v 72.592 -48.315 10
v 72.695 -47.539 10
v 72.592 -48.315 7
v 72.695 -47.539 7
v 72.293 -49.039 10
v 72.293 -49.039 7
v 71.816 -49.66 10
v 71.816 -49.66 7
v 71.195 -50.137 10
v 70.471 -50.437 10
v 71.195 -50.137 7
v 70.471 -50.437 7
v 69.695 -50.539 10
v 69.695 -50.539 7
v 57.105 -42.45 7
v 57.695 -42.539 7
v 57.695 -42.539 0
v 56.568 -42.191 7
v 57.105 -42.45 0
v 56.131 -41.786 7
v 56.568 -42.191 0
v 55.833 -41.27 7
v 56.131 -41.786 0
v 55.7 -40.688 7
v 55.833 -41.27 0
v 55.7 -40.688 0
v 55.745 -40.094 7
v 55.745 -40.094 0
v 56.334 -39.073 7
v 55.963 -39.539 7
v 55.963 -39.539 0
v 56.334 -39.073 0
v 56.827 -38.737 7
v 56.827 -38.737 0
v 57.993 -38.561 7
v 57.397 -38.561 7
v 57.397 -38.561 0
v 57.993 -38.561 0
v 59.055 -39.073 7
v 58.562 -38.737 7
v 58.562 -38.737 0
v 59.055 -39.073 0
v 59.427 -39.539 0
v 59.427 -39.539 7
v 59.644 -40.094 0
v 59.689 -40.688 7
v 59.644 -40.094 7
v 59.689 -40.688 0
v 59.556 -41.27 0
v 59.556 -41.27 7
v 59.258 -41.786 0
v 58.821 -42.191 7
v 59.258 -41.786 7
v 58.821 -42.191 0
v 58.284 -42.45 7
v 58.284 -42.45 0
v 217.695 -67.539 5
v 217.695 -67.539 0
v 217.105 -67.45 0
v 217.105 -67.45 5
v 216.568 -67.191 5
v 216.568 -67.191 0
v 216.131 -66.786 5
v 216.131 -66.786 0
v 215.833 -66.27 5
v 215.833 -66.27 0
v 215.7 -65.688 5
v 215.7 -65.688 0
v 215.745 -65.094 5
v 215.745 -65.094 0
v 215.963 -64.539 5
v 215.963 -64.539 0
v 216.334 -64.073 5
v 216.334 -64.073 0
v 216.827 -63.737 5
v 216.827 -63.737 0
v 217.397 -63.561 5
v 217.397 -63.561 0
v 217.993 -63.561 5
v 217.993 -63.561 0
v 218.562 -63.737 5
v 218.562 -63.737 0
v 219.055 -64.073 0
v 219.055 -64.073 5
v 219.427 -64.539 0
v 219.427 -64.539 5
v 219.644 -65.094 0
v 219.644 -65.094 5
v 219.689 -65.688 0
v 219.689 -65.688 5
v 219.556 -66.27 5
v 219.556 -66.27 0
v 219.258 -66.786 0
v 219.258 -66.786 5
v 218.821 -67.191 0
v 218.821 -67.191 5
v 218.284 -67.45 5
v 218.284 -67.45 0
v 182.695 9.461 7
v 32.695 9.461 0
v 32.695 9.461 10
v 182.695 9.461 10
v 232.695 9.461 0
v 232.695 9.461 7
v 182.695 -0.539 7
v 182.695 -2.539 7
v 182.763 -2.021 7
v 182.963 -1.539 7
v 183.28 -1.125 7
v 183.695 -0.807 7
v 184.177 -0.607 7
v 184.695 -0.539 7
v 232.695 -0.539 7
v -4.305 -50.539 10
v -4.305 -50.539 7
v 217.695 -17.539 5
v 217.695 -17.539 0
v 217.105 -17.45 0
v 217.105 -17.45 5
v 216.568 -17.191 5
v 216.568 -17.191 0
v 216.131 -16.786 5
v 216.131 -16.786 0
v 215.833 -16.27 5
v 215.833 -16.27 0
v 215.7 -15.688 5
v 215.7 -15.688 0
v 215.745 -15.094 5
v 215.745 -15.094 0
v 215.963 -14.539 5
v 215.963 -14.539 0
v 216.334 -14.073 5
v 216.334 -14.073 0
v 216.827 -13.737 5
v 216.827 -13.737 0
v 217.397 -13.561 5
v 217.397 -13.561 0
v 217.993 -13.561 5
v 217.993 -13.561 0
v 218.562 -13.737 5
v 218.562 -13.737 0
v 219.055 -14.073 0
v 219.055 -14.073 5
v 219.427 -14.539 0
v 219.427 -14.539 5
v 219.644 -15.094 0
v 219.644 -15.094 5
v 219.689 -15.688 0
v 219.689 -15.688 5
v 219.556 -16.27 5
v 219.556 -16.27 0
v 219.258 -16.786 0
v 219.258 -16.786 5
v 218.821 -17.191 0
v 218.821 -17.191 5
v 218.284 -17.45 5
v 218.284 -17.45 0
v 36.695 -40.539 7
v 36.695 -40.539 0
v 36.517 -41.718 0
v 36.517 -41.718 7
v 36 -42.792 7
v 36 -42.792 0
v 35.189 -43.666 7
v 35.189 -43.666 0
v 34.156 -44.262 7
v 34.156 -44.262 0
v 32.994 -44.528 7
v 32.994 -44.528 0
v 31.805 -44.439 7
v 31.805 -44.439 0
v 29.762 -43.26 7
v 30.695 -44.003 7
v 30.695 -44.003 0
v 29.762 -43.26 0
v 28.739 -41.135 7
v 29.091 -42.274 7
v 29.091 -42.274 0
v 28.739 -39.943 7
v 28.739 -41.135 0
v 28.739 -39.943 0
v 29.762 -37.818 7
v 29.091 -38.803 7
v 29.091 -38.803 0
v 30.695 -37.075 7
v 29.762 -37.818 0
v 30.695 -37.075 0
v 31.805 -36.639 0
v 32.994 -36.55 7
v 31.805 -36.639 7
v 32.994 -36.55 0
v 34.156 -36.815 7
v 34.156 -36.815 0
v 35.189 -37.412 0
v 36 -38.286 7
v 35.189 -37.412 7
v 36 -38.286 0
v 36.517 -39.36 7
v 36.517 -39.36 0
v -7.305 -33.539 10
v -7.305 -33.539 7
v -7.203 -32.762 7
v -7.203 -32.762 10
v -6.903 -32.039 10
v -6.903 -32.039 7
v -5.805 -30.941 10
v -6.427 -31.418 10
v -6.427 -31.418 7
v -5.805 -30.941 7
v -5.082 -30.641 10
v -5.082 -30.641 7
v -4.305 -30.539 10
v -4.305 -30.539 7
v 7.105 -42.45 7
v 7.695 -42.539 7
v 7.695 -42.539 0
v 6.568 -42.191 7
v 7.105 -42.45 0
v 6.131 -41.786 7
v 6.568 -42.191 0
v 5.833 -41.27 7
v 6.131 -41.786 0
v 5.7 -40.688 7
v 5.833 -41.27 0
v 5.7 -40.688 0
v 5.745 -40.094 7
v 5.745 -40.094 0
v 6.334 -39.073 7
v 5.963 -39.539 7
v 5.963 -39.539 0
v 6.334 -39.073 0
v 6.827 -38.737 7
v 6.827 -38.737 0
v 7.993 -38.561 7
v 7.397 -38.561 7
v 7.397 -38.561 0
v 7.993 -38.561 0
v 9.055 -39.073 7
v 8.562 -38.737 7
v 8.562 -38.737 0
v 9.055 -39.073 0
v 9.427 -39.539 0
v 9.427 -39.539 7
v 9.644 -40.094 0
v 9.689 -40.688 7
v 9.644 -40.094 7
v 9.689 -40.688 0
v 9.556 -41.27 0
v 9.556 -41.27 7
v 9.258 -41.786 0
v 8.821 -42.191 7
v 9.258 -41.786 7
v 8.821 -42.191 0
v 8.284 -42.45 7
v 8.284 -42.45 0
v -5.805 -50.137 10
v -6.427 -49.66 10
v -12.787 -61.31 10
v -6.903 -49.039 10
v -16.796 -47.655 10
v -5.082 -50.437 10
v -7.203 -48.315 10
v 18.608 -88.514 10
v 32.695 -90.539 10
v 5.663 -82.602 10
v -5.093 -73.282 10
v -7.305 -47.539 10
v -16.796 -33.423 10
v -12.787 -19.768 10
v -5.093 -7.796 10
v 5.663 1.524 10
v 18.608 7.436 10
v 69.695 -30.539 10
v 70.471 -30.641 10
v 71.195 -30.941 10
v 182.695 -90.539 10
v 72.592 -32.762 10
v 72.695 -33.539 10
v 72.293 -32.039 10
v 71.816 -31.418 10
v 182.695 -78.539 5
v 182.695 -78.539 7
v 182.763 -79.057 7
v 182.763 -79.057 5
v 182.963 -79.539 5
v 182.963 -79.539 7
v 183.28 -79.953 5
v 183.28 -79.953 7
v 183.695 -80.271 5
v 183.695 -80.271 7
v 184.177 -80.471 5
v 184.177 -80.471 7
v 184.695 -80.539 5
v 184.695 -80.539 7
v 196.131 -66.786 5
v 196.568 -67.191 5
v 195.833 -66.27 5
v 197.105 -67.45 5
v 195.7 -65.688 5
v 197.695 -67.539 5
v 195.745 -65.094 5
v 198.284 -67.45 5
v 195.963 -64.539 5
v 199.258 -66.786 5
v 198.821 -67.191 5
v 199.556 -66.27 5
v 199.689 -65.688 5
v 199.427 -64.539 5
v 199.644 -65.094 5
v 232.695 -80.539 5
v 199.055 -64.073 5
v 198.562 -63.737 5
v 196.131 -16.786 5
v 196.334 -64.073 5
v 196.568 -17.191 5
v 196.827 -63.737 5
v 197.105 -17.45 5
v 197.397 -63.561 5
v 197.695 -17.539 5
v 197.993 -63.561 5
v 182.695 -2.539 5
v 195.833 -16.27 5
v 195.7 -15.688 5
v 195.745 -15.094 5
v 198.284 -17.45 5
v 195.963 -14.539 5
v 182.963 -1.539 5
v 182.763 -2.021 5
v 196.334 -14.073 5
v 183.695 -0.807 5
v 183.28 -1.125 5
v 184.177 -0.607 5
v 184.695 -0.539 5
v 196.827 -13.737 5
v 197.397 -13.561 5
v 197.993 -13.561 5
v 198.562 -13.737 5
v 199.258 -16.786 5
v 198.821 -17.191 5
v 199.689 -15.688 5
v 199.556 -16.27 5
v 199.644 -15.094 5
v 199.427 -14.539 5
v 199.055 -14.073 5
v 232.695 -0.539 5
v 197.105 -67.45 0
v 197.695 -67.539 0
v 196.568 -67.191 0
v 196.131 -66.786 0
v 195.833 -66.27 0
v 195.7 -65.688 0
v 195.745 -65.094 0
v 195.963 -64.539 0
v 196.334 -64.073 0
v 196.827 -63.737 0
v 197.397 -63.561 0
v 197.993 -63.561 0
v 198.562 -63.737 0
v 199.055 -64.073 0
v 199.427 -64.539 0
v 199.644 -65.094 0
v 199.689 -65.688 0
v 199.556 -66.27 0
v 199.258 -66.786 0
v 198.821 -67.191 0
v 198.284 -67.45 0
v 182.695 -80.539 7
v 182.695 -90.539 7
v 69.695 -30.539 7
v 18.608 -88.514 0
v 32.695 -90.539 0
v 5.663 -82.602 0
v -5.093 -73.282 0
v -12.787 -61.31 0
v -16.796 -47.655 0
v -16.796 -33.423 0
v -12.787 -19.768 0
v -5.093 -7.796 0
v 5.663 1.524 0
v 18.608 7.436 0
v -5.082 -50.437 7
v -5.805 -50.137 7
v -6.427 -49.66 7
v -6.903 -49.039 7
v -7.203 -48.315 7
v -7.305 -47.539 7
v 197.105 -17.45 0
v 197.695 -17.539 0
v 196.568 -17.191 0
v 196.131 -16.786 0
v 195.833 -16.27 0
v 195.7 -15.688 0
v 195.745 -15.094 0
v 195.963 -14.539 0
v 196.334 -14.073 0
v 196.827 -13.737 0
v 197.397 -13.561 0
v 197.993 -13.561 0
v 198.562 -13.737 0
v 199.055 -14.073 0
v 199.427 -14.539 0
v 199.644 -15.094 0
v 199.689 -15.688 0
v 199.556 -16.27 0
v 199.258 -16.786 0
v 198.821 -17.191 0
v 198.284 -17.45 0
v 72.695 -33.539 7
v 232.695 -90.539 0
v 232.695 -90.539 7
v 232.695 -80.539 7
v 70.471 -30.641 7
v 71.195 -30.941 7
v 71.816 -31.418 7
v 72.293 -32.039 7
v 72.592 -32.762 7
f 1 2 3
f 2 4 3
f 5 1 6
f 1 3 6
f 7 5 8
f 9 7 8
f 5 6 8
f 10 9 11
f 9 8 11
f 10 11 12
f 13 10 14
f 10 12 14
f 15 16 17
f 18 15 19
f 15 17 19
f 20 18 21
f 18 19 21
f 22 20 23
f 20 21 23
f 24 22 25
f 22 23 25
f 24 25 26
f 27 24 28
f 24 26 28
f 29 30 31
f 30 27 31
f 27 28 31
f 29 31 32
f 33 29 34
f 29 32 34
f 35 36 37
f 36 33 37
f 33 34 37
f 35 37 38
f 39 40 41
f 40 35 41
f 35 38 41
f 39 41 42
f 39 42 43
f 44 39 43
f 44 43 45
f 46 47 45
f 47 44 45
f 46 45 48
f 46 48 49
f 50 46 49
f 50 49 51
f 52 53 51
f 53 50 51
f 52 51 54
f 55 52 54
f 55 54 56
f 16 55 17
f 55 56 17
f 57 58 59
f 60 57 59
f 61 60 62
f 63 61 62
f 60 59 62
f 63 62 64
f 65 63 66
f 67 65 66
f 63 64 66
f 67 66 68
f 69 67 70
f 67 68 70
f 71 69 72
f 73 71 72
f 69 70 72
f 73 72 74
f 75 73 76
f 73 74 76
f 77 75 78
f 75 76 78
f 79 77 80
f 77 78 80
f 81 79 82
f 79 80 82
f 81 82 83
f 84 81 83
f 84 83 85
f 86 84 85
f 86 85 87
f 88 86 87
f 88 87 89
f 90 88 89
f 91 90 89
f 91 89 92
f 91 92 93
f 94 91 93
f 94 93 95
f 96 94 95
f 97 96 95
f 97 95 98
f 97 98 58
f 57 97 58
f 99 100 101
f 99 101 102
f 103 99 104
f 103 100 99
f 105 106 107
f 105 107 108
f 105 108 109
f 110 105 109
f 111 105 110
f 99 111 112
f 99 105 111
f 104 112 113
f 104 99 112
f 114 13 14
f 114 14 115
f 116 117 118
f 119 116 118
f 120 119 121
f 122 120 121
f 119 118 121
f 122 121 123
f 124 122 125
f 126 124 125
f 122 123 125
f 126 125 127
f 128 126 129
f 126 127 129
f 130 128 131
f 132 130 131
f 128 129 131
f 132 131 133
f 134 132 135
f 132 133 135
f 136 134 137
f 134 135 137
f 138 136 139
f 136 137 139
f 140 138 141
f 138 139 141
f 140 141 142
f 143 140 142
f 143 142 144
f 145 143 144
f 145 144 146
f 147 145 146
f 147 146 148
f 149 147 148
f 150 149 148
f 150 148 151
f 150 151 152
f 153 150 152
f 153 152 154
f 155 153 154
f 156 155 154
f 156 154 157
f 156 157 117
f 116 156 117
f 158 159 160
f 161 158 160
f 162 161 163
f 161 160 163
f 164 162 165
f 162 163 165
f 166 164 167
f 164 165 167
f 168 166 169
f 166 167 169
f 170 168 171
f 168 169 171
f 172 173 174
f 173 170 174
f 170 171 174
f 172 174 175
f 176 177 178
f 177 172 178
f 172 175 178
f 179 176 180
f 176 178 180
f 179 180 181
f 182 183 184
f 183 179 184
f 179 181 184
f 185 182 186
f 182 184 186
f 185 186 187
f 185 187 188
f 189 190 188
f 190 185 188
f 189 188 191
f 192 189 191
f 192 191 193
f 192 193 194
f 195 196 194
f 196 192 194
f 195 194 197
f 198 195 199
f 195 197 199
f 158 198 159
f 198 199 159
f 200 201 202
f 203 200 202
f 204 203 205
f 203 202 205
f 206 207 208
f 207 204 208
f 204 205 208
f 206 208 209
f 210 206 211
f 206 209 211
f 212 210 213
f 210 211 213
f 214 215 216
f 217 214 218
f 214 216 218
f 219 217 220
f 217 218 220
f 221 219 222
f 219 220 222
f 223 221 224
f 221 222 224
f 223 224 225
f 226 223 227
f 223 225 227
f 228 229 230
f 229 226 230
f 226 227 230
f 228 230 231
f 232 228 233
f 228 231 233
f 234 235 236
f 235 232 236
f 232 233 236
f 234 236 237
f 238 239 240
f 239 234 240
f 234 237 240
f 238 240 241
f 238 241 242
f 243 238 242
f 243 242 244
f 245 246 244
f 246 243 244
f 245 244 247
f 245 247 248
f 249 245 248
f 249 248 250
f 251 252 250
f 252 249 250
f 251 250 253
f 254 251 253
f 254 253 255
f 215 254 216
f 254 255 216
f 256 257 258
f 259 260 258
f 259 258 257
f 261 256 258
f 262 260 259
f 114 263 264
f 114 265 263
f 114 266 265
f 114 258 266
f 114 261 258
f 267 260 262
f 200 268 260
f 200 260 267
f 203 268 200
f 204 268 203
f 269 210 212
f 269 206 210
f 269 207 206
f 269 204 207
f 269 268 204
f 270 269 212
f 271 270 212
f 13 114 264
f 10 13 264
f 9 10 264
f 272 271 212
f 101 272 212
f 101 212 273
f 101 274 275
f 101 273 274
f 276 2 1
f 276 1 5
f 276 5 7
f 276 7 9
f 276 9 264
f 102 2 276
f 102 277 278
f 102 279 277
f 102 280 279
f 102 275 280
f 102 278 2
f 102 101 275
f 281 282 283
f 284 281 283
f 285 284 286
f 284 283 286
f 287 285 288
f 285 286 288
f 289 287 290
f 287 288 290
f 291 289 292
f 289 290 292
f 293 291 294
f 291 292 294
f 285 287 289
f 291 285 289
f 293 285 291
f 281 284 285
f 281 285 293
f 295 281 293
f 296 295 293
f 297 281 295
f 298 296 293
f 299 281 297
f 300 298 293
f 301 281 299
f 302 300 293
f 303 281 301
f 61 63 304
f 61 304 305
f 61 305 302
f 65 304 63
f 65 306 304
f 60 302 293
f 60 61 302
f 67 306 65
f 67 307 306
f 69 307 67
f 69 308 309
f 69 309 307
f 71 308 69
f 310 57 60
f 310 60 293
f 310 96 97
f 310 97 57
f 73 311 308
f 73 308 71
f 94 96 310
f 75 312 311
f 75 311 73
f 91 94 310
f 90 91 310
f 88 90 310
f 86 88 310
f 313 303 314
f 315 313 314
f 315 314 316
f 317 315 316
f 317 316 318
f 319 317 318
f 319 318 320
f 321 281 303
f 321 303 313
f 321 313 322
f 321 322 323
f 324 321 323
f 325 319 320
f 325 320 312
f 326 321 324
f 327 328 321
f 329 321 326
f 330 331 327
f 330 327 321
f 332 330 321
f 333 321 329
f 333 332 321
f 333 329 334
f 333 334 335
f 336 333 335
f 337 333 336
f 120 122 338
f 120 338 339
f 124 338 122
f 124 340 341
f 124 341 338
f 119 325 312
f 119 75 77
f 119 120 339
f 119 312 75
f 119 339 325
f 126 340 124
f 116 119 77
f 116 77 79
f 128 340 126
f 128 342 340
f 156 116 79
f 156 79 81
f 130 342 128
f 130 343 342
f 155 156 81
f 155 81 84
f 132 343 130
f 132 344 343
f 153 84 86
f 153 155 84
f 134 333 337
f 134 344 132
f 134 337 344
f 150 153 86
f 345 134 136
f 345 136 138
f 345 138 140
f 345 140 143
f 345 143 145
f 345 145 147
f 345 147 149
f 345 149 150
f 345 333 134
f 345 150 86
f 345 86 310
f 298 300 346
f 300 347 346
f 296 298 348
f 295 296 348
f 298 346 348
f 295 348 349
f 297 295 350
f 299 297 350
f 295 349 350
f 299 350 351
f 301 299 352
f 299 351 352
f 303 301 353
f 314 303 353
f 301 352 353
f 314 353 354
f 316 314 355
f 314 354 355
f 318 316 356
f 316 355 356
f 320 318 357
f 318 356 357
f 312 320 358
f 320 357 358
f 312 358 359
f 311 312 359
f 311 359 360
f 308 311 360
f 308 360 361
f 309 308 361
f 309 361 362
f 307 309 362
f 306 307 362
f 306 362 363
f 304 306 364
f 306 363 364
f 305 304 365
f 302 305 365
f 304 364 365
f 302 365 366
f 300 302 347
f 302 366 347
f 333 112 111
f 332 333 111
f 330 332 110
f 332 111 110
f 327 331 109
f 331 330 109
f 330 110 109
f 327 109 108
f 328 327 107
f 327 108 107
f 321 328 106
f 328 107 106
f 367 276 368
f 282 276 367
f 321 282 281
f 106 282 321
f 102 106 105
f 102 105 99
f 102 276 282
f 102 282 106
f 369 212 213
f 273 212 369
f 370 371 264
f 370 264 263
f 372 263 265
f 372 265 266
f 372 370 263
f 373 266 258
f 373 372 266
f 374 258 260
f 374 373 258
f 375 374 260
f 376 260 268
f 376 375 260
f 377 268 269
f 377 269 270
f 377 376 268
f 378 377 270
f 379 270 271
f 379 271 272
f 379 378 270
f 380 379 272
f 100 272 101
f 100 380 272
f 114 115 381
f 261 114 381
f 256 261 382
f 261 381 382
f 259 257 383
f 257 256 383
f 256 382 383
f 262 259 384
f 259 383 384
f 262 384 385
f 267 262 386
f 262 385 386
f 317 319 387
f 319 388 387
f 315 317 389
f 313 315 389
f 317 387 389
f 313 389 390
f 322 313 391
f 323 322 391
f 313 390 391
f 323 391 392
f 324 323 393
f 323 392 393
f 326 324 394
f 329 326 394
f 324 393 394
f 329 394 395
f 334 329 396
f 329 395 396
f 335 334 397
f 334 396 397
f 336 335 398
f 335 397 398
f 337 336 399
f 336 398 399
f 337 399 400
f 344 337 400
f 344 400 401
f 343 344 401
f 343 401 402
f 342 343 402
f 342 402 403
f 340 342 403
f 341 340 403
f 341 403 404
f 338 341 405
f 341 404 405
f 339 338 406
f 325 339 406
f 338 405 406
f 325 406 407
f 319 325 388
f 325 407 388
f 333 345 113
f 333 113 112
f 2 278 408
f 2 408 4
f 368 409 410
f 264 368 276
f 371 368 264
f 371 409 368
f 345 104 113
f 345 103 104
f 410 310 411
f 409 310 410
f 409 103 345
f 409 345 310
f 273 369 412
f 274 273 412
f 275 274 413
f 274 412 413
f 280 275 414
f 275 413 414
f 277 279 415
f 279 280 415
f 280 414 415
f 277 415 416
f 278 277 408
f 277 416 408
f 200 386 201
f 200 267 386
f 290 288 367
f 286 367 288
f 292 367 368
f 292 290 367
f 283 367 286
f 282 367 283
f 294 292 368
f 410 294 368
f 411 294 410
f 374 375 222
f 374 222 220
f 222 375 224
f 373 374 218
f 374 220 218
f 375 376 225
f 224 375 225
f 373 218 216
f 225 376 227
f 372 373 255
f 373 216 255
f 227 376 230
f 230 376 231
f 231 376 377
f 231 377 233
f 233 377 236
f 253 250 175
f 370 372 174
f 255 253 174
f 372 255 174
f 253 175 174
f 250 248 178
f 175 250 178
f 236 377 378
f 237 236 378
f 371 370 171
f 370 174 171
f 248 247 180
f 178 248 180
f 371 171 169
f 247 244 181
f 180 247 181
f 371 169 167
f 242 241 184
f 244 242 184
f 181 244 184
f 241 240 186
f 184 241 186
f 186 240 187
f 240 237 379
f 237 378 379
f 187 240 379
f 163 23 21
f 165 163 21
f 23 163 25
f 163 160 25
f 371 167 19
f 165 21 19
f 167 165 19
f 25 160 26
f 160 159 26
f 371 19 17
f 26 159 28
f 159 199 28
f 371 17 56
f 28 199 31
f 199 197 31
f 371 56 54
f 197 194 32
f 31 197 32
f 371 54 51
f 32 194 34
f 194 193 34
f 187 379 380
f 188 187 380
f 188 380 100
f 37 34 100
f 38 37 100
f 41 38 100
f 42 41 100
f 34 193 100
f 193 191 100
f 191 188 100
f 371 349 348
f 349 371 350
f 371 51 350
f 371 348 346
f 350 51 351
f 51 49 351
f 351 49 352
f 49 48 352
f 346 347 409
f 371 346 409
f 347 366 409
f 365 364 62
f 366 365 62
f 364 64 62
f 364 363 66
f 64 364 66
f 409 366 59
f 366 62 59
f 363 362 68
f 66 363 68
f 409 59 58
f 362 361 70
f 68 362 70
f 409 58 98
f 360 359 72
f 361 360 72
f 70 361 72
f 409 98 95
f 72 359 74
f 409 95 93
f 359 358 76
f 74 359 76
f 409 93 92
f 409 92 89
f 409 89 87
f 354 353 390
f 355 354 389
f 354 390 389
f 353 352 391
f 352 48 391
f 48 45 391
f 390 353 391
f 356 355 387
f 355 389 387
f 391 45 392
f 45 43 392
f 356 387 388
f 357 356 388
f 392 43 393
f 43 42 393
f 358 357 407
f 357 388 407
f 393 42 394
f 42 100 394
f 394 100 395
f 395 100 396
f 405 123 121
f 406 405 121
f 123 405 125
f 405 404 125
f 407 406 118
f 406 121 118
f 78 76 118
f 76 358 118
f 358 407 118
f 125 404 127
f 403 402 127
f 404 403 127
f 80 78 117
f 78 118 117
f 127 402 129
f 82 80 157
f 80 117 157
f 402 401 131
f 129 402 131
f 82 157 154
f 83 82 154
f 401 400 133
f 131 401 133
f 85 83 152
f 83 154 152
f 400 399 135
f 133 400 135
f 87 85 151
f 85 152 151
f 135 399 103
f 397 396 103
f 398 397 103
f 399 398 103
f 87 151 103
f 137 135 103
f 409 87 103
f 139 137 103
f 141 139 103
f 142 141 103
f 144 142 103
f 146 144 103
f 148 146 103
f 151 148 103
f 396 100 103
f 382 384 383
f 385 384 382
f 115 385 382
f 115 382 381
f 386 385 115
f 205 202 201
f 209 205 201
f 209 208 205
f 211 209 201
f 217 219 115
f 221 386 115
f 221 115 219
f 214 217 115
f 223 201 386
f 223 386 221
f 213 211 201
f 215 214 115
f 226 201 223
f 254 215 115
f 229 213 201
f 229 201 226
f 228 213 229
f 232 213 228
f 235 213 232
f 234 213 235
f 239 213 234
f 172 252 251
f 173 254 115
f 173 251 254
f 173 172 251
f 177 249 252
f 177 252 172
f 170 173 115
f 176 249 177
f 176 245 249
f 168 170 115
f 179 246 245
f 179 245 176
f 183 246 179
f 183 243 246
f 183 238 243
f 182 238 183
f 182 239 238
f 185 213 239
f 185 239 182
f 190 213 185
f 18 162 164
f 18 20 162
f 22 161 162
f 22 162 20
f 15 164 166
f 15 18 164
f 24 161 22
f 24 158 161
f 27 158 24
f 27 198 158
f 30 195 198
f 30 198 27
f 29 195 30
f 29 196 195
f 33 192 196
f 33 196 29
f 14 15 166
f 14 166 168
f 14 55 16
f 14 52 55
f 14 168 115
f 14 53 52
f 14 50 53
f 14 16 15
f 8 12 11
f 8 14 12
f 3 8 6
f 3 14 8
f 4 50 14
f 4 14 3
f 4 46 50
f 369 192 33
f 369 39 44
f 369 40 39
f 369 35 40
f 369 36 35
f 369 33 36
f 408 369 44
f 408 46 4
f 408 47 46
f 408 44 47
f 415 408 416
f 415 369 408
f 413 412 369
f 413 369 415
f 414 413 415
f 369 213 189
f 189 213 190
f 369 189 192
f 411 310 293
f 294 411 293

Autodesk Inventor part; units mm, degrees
ref_plane "YZ Plane" through (0, 0, 0) normal (1, 0, 0) x (0, 1, 0)
ref_plane "XZ Plane" through (0, 0, 0) normal (0, 1, 0) x (-1, 0, 0)
ref_plane "XY Plane" through (0, 0, 0) normal (0, 0, 1) x (1, 0, 0)
sketch "Sketch1" plane through (0, 0, 0) normal (0, 0, 1) x (1, 0, 0)
  line L0 (232.6946, -90.5389) -> (32.6946, -90.5389)
  line L1 (-17.3054, -40.5389) -> (-17.3054, -40.5389)
  line L2 (32.6946, 9.4611) -> (232.6946, 9.4611)
  line L3 (232.6946, 9.4611) -> (232.6946, -90.5389)
  circle A0 centre (32.6946, -40.5389) radius 4
  arc A1 (-17.3054, -40.5389) -> (32.6946, -90.5389) centre (32.6946, -40.5389) ccw
  arc A2 (32.6946, 9.4611) -> (-17.3054, -40.5389) centre (32.6946, -40.5389) ccw
  point P0 (0, 0)
  point P1 (-17.3054, 9.4611)
  point P2 (-17.3054, -90.5389)
  dimension "d0" = 250
  dimension "d1" = 100
  dimension "d2" = 8
  dimension "d3" = 50
  dimension "d4" = 50
  dimension "d5" = 50
extrude "Extrusion1" add sketch "Sketch1" along normal blind 10
sketch "Sketch2" plane through (0, 0, 10) normal (0, 0, 1) x (1, 0, 0)
  line L0 (32.6946, 9.4611) -> (232.6946, 9.4611) projected
  line L1 (232.6946, -90.5389) -> (182.6946, -90.5389)
  line L2 (182.6946, -90.5389) -> (182.6946, 9.4611)
  line L3 (182.6946, 9.4611) -> (232.6946, 9.4611)
  line L4 (232.6946, 9.4611) -> (232.6946, -90.5389)
  point P0 (0, 0)
  dimension "d8" = 50
extrude "Extrusion2" cut sketch "Sketch2" against normal blind 5
sketch "Sketch3" plane through (0, 0, 5) normal (0, 0, 1) x (1, 0, 0)
  line L0 (182.6946, 9.4611) -> (232.6946, 9.4611) projected
  line L1 (182.6946, 9.4611) -> (182.6946, -90.5389) projected
  line L2 (232.6946, -90.5389) -> (182.6946, -90.5389) projected
  line L3 (232.6946, 9.4611) -> (232.6946, -90.5389) projected
  point P0 (0, 0)
  point P1 (197.6946, -65.5389)
  point P2 (197.6946, -15.5389)
  point P3 (217.6946, -15.5389)
  point P4 (217.6946, -65.5389)
  dimension "d11" = 15
  dimension "d12" = 25
  dimension "d13" = 25
  dimension "d14" = 15
hole "Hole1" at (197.6946, -65.5389, 5) at (197.6946, -15.5389, 5) at (217.6946, -15.5389, 5) at (217.6946, -65.5389, 5) direction (0, 0, -1) diameter 4 end through all
sketch "Sketch4" plane through (0, 0, 10) normal (0, 0, 1) x (1, 0, 0)
  arc A0 (32.6946, 9.4611) -> (32.6946, -90.5389) centre (32.6946, -40.5389) ccw projected
  point P0 (0, 0)
  point P1 (7.6946, -40.5389)
  point P2 (57.6946, -40.5389)
  dimension "d22" = 25
  dimension "d23" = 25
hole "Hole2" at (7.6946, -40.5389, 10) at (57.6946, -40.5389, 10) direction (0, 0, -1) diameter 4 end through all
sketch "Sketch5" plane through (0, 0, 10) normal (0, 0, 1) x (1, 0, 0)
  circle A0 centre (57.6946, -40.5389) radius 2 projected
  circle A1 centre (7.6946, -40.5389) radius 2 projected
  arc A2 (32.6946, 9.4611) -> (32.6946, -90.5389) centre (32.6946, -40.5389) ccw projected
  circle A3 centre (32.6946, -40.5389) radius 4 projected
  line L0 (72.6946, -50.5389) -> (-7.3054, -50.5389)
  line L1 (-7.3054, -50.5389) -> (-7.3054, -30.5389)
  line L2 (-7.3054, -30.5389) -> (72.6946, -30.5389)
  line L3 (72.6946, -30.5389) -> (72.6946, -50.5389)
  point P0 (0, 0)
  dimension "d35" = 80
  dimension "d36" = 20
  dimension "d37" = 40
  dimension "d38" = 10
extrude "Extrusion3" cut sketch "Sketch5" against normal blind 3
sketch "Sketch6" plane through (0, 0, 5) normal (0, 0, 1) x (1, 0, 0)
  line L0 (232.6946, 9.4611) -> (232.6946, -90.5389) projected
  line L1 (182.6946, -90.5389) -> (232.6946, -90.5389)
  line L2 (232.6946, -90.5389) -> (232.6946, -80.5389)
  line L3 (232.6946, -80.5389) -> (182.6946, -80.5389)
  line L4 (182.6946, -80.5389) -> (182.6946, -90.5389)
  line L5 (182.6946, 9.4611) -> (232.6946, 9.4611)
  line L6 (232.6946, 9.4611) -> (232.6946, -0.5389)
  line L7 (232.6946, -0.5389) -> (182.6946, -0.5389)
  line L8 (182.6946, -0.5389) -> (182.6946, 9.4611)
  point P0 (0, 0)
  dimension "d41" = 10
  dimension "d42" = 10
extrude "Extrusion4" add sketch "Sketch6" along normal blind 2
fillet "Fillet1" radius 2 2 edges at (182.6946, -0.5389, 6) (182.6946, -80.5389, 6)
fillet "Fillet2" radius 3 4 edges at (-7.3054, -30.5389, 8.5) (-7.3054, -50.5389, 8.5) (72.6946, -30.5389, 8.5) (72.6946, -50.5389, 8.5)
equation "\"d4\" = 0.5 * d1"
equation "\"d23\" = d22"
equation "\"d37\" = 0.5 * d35"
equation "\"d38\" = 0.5 * d36"
properties part number "plancha base"
